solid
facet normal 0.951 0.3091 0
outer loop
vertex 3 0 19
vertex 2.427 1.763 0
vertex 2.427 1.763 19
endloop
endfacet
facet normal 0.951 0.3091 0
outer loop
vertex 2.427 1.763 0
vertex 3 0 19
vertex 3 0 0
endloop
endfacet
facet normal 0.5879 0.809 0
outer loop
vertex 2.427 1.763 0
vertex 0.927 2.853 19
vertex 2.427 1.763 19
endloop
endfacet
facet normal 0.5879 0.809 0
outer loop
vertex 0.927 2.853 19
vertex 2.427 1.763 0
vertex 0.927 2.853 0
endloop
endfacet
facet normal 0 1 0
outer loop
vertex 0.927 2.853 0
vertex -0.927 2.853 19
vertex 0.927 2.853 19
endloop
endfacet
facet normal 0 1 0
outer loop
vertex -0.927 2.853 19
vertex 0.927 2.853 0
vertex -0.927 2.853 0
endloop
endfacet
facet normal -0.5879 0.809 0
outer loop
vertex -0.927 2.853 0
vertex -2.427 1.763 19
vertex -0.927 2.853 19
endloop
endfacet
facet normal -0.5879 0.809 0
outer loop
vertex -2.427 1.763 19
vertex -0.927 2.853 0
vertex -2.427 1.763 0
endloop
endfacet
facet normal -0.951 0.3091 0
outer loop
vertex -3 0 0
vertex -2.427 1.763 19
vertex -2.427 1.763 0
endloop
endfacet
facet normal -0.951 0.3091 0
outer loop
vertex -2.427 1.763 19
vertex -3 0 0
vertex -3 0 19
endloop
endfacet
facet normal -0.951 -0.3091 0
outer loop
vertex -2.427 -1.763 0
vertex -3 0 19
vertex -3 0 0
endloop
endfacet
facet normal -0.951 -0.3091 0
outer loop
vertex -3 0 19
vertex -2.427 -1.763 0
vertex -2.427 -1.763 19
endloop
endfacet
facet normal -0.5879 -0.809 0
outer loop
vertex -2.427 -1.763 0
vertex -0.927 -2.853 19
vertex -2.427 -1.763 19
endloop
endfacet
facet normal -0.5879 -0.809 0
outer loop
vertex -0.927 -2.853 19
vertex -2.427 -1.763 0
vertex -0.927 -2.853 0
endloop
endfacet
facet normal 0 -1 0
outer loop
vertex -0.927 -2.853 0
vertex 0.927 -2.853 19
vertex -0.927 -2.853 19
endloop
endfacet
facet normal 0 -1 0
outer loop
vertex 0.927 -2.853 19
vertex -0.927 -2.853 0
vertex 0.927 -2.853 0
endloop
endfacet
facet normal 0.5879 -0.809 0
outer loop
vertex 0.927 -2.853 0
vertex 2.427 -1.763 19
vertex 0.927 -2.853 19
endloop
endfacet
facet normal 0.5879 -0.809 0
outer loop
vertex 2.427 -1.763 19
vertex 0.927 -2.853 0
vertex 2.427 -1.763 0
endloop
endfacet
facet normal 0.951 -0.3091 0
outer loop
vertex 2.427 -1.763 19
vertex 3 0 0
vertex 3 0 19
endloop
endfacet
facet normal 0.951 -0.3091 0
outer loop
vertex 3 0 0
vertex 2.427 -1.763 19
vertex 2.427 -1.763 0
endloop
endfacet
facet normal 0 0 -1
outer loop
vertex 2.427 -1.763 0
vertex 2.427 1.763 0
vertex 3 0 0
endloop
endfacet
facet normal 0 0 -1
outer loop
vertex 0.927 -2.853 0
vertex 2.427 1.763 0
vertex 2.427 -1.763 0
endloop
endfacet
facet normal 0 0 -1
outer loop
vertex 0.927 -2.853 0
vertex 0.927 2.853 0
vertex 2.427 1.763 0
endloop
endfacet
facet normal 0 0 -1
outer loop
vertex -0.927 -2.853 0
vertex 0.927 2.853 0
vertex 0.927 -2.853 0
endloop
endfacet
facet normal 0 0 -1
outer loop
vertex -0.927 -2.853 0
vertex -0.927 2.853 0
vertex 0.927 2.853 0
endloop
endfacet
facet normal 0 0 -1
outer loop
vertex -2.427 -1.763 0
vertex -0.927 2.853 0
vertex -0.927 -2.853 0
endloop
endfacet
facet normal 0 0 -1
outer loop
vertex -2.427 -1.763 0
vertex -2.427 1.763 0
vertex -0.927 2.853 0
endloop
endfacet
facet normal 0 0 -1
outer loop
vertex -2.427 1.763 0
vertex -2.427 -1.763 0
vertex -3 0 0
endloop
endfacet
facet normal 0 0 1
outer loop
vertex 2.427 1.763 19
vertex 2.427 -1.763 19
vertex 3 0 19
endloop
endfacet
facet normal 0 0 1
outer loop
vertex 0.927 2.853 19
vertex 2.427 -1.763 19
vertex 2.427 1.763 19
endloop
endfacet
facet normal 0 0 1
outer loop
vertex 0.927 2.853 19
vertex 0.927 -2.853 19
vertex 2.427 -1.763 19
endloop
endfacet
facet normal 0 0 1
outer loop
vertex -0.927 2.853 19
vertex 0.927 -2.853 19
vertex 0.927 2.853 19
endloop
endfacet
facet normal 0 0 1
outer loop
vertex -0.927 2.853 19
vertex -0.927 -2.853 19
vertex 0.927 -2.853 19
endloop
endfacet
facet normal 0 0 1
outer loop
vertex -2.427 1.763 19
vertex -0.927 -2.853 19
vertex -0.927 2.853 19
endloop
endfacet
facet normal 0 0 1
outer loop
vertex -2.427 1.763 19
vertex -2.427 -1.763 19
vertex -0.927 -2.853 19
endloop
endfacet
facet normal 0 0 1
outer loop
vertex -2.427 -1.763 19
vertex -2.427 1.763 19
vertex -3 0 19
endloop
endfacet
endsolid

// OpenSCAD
// Generated by SolidPython 1.0.1 on 2020-07-29 00:46:45


cylinder(h = 19, r1 = 3, r2 = 3);
/***********************************************
*********      SolidPython code:      **********
************************************************
 
# import packages: SolidPython
from solid import *
from solid.utils import *
from itertools import chain, combinations, permutations


class Resize:

    def __init__(self, scad_file):
        self.scad_file = scad_file
        #self.scad_file = import_scad(scad_file)
        # cone/cylinder param:
        self.r1 = 0
        self.r2 = 0
        self.h = 0
        # rectangular prism param:
        self.w = 0
        self.l = 0
        # ellipse param:
        self.r = 0

    # import OpenScad code (file name corresponds to shape)


    # classify shape + parameters
    def assign(self, param1, param2, param3):
        if self.scad_file == 'cone.scad':
            self.r1 = param1
            self.r2 = param2
            self.h = param3
        elif self.scad_file == 'cylinder.scad':
            self.r1 = param1
            self.r2 = param2
            self.h = param3
        elif self.scad_file == 'rectangularPrism.scad':
            self.h = param1
            self.l = param2
            self.w = param3
        else:
            self.r = param1
            self.h = param2

    # resize parameters
    def iterate(self):
        x = range(3, 20, 2)
        i = 1
        if self.scad_file == 'cone.scad':
            tempList = list(permutations(x, 2))
            for temp in tempList:
                param1 = temp[0]
                param2 = temp[1]
                filepath = 'produced_scad_files/' + 'cone' + str(param1) + '_' + str(param2) + '_' + '.scad'
                scad_render_to_file(cylinder(h=param1, r1=param2, r2=0), filepath)

        elif self.scad_file == 'cylinder.scad':
            tempList = list(permutations(x, 3))
            for temp in tempList:
                param1 = temp[0]
                param2 = temp[1]
                filepath = 'produced_scad_files/' + 'cylinder' + str(param1) + '_' + str(param2) + '_' + '.scad'
                scad_render_to_file(cylinder(h=param1, r1=param2, r2=param2), filepath)

        elif self.scad_file == 'rectangularPrism.scad':
            tempList = list(permutations(x, 3))
            for temp in tempList:
                param1 = temp[0]
                param2 = temp[1]
                param3 = temp[2]
                filepath = 'produced_scad_files/' + 'rectangularPrism' + str(param1) + '_' + str(param2) + '_' + str(
                    param3) + '.scad'
                scad_render_to_file(cube(size=(param1, param2, param3)), filepath)

        elif self.scad_file == 'ellipse.scad':
            tempList = list(permutations(x, 4))
            for temp in tempList:
                param1 = temp[0]
                param2 = temp[1]
                param3 = temp[2]
                param4 = temp[3]
                filepath = 'produced_scad_files/' + 'ellipse' + str(param1) + '_' + str(param2) + '_' + str(param3) + '_' + str(param4) + '.scad'
                scad_render_to_file(scale([param1, param2, param3])(sphere(r=param4)), filepath)

    def render_to_scadfile(self):
        scad_render_to_file(scad, 'example.scad') 
 
************************************************/
